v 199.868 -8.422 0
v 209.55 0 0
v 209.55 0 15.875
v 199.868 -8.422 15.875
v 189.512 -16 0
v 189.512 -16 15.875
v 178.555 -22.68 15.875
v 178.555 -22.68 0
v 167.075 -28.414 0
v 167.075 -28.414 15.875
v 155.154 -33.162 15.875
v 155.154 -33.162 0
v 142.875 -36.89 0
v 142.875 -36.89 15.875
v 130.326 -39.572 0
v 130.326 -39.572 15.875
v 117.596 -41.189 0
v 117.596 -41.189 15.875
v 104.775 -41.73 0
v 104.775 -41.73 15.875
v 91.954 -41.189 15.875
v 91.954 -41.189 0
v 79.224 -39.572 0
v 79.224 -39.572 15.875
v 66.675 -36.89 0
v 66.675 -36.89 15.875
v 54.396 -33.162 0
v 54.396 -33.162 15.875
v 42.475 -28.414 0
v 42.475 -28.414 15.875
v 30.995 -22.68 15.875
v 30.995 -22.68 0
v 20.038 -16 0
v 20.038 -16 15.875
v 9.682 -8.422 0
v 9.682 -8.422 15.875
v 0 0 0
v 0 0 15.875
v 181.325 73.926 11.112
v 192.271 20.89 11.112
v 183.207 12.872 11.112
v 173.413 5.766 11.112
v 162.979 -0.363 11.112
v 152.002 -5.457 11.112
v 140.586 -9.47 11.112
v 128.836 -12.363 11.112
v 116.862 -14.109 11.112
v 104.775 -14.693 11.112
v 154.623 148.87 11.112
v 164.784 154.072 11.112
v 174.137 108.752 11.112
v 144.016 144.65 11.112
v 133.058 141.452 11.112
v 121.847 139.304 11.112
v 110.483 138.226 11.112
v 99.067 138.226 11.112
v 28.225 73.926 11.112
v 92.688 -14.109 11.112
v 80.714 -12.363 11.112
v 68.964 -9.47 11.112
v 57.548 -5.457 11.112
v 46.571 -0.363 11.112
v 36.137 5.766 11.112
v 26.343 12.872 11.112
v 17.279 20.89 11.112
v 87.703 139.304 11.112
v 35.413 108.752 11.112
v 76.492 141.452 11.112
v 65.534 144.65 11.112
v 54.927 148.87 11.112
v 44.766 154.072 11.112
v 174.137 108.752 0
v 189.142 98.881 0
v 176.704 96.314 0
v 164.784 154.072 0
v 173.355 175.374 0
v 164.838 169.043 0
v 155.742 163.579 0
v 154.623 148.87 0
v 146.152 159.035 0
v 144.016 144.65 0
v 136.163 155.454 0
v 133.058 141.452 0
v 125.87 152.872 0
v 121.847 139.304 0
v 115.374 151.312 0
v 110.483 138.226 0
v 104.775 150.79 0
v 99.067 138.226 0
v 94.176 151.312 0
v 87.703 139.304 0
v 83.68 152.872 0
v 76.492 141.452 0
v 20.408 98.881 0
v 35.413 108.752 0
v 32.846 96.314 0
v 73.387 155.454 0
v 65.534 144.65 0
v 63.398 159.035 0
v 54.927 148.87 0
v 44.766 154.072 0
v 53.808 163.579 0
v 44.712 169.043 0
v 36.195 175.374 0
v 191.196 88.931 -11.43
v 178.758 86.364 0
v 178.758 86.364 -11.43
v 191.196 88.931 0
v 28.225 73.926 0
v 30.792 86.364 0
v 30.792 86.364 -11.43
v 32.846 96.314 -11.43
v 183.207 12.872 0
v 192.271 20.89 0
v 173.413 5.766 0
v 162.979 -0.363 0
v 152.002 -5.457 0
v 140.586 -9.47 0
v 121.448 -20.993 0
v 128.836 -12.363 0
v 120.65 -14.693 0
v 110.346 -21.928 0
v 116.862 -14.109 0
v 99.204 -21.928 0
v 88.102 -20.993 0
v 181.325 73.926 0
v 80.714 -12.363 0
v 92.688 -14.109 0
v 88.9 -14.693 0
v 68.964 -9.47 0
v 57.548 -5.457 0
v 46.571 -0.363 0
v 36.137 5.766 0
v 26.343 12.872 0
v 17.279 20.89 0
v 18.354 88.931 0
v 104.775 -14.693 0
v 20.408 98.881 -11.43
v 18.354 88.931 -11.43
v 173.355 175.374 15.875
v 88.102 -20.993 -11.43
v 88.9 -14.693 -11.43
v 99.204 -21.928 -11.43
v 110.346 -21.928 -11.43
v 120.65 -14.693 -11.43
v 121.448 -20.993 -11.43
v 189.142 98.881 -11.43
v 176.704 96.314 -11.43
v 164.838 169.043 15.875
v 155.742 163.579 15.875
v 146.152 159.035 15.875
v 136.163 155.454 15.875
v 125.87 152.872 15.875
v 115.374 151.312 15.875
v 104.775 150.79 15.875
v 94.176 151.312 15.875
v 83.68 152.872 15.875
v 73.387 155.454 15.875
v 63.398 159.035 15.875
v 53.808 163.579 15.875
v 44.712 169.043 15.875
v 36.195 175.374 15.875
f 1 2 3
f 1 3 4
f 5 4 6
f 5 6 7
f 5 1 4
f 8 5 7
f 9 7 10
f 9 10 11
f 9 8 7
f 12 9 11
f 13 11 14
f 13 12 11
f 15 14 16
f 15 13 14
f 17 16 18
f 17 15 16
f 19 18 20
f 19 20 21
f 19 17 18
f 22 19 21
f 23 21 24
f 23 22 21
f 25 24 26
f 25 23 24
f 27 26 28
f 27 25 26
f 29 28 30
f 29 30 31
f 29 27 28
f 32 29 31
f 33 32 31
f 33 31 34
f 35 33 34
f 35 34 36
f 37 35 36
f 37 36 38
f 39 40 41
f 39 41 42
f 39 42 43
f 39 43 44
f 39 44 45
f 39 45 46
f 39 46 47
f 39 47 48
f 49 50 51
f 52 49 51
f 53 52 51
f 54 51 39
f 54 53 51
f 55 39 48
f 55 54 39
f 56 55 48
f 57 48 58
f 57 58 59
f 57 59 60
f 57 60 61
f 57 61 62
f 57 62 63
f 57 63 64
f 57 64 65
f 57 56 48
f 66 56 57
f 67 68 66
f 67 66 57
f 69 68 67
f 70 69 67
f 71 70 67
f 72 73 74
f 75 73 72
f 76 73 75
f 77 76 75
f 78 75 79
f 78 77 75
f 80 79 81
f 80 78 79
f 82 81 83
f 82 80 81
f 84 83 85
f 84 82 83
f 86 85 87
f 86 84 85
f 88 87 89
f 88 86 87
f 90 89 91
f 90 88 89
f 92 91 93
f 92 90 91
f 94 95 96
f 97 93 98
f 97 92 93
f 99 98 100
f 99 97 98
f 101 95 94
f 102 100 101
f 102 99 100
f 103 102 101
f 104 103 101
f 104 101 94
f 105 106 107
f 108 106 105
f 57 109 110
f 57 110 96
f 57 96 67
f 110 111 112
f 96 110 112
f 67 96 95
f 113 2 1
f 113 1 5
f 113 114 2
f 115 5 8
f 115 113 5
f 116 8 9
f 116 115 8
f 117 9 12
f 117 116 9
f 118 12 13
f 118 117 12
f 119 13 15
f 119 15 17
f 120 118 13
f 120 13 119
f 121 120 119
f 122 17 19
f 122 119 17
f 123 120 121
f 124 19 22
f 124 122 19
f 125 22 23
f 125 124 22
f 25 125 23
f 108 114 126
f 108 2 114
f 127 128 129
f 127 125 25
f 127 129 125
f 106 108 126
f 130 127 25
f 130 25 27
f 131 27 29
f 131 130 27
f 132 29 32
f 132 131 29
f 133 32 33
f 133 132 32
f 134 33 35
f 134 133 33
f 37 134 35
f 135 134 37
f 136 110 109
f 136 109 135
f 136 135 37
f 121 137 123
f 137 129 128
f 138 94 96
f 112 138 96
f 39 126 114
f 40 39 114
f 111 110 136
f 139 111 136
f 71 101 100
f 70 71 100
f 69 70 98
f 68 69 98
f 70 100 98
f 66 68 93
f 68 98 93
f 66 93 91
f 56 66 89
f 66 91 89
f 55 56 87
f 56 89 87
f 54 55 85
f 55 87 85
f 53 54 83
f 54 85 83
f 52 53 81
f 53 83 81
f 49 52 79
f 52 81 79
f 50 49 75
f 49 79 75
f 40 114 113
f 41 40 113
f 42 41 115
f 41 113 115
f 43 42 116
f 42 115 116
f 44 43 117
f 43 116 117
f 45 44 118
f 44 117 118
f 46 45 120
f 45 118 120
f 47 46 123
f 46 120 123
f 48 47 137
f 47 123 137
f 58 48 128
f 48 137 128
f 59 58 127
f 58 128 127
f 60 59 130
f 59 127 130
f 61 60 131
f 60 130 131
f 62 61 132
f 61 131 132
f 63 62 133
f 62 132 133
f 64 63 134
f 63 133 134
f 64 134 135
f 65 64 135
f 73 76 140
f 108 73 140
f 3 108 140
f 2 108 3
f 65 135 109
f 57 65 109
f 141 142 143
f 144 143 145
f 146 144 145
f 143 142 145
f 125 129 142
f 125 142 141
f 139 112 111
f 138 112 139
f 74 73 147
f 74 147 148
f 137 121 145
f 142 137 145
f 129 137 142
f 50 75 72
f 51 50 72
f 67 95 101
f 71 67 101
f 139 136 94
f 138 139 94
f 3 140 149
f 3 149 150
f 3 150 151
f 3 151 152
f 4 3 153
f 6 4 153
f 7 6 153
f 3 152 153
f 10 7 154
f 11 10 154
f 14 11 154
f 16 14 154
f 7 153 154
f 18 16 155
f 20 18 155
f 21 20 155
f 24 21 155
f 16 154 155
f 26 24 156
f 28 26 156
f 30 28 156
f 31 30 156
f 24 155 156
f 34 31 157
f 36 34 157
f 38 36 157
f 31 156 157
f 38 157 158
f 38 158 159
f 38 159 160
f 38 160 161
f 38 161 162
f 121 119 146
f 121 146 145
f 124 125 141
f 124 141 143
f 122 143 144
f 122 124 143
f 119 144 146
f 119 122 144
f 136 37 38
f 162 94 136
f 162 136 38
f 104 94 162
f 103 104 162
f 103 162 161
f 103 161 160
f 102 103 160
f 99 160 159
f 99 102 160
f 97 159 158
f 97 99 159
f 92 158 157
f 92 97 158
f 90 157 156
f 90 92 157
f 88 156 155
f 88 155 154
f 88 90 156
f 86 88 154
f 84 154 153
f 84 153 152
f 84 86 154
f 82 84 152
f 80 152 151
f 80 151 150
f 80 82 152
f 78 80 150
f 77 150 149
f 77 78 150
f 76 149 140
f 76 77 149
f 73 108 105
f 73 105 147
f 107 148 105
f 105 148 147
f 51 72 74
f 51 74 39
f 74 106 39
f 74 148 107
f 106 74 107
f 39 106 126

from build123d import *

# Parameters (mm, degrees)
BOSS_EXTRUDE1_DEPTH     = 15.875
BOSS_EXTRUDE2_DEPTH     = 11.43
CUT_EXTRUDE1_DEPTH      = 12.43
CUT_EXTRUDE1_DEPTH_BACK = 11.1125


with BuildPart() as part:
    # Sketch1 → Boss-Extrude1 (new body)
    with BuildSketch(Plane.XY):
        with BuildLine():
            Line((0, 0), (36.195, 175.373848891))
            ThreePointArc((36.195, 175.373848891), (104.775, 150.790425527), (173.355, 175.373848891))
            Line((173.355, 175.373848891), (209.55, 0))
            ThreePointArc((209.55, 0), (104.775, -41.729500882), (0, 0))
        make_face()
    extrude(amount=BOSS_EXTRUDE1_DEPTH)

    # Sketch2 → Boss-Extrude2 (add)
    with BuildSketch(Plane.XY):
        Polygon((20.407819149, 98.880999907), (39.064611584, 95.030467992), (37.010994563, 85.080178693), (18.354202128, 88.930710608), align=None)
        Polygon((189.142180851, 98.880999907), (170.485388416, 95.030467992), (172.539005437, 85.080178693), (191.195797872, 88.930710608), align=None)
        with BuildLine():
            Line((121.447738693, -20.993053202), (120.65, -14.693361703))
            Line((120.65, -14.693361703), (88.9, -14.693361703))
            Line((88.9, -14.693361703), (88.102261307, -20.993053202))
            ThreePointArc((88.102261307, -20.993053202), (104.775, -22.044500882), (121.447738693, -20.993053202))
        make_face()
    extrude(amount=-BOSS_EXTRUDE2_DEPTH)

    # Sketch4 → Cut-Extrude1 (cut, two sides)
    with BuildSketch(Plane(origin=(0, 0, 0), x_dir=(-1, 0, 0), z_dir=(0, 0, -1))) as cut_extrude1_sk:
        with BuildLine():
            Line((-174.137297951, 108.751840254), (-181.324957525, 73.925827708))
            Line((-181.324957525, 73.925827708), (-192.270924578, 20.889873244))
            ThreePointArc((-192.270924578, 20.889873244), (-104.775, -14.693361703), (-17.279075422, 20.889873244))
            Line((-17.279075422, 20.889873244), (-28.225042475, 73.925827708))
            Line((-28.225042475, 73.925827708), (-35.412702049, 108.751840254))
            Line((-35.412702049, 108.751840254), (-44.766321163, 154.072469762))
            ThreePointArc((-44.766321163, 154.072469762), (-104.775, 138.090425527), (-164.783678837, 154.072469762))
            Line((-164.783678837, 154.072469762), (-174.137297951, 108.751840254))
        make_face()
    extrude(amount=CUT_EXTRUDE1_DEPTH, mode=Mode.SUBTRACT)
    extrude(cut_extrude1_sk.sketch, amount=-CUT_EXTRUDE1_DEPTH_BACK, mode=Mode.SUBTRACT)


solid = part.part
